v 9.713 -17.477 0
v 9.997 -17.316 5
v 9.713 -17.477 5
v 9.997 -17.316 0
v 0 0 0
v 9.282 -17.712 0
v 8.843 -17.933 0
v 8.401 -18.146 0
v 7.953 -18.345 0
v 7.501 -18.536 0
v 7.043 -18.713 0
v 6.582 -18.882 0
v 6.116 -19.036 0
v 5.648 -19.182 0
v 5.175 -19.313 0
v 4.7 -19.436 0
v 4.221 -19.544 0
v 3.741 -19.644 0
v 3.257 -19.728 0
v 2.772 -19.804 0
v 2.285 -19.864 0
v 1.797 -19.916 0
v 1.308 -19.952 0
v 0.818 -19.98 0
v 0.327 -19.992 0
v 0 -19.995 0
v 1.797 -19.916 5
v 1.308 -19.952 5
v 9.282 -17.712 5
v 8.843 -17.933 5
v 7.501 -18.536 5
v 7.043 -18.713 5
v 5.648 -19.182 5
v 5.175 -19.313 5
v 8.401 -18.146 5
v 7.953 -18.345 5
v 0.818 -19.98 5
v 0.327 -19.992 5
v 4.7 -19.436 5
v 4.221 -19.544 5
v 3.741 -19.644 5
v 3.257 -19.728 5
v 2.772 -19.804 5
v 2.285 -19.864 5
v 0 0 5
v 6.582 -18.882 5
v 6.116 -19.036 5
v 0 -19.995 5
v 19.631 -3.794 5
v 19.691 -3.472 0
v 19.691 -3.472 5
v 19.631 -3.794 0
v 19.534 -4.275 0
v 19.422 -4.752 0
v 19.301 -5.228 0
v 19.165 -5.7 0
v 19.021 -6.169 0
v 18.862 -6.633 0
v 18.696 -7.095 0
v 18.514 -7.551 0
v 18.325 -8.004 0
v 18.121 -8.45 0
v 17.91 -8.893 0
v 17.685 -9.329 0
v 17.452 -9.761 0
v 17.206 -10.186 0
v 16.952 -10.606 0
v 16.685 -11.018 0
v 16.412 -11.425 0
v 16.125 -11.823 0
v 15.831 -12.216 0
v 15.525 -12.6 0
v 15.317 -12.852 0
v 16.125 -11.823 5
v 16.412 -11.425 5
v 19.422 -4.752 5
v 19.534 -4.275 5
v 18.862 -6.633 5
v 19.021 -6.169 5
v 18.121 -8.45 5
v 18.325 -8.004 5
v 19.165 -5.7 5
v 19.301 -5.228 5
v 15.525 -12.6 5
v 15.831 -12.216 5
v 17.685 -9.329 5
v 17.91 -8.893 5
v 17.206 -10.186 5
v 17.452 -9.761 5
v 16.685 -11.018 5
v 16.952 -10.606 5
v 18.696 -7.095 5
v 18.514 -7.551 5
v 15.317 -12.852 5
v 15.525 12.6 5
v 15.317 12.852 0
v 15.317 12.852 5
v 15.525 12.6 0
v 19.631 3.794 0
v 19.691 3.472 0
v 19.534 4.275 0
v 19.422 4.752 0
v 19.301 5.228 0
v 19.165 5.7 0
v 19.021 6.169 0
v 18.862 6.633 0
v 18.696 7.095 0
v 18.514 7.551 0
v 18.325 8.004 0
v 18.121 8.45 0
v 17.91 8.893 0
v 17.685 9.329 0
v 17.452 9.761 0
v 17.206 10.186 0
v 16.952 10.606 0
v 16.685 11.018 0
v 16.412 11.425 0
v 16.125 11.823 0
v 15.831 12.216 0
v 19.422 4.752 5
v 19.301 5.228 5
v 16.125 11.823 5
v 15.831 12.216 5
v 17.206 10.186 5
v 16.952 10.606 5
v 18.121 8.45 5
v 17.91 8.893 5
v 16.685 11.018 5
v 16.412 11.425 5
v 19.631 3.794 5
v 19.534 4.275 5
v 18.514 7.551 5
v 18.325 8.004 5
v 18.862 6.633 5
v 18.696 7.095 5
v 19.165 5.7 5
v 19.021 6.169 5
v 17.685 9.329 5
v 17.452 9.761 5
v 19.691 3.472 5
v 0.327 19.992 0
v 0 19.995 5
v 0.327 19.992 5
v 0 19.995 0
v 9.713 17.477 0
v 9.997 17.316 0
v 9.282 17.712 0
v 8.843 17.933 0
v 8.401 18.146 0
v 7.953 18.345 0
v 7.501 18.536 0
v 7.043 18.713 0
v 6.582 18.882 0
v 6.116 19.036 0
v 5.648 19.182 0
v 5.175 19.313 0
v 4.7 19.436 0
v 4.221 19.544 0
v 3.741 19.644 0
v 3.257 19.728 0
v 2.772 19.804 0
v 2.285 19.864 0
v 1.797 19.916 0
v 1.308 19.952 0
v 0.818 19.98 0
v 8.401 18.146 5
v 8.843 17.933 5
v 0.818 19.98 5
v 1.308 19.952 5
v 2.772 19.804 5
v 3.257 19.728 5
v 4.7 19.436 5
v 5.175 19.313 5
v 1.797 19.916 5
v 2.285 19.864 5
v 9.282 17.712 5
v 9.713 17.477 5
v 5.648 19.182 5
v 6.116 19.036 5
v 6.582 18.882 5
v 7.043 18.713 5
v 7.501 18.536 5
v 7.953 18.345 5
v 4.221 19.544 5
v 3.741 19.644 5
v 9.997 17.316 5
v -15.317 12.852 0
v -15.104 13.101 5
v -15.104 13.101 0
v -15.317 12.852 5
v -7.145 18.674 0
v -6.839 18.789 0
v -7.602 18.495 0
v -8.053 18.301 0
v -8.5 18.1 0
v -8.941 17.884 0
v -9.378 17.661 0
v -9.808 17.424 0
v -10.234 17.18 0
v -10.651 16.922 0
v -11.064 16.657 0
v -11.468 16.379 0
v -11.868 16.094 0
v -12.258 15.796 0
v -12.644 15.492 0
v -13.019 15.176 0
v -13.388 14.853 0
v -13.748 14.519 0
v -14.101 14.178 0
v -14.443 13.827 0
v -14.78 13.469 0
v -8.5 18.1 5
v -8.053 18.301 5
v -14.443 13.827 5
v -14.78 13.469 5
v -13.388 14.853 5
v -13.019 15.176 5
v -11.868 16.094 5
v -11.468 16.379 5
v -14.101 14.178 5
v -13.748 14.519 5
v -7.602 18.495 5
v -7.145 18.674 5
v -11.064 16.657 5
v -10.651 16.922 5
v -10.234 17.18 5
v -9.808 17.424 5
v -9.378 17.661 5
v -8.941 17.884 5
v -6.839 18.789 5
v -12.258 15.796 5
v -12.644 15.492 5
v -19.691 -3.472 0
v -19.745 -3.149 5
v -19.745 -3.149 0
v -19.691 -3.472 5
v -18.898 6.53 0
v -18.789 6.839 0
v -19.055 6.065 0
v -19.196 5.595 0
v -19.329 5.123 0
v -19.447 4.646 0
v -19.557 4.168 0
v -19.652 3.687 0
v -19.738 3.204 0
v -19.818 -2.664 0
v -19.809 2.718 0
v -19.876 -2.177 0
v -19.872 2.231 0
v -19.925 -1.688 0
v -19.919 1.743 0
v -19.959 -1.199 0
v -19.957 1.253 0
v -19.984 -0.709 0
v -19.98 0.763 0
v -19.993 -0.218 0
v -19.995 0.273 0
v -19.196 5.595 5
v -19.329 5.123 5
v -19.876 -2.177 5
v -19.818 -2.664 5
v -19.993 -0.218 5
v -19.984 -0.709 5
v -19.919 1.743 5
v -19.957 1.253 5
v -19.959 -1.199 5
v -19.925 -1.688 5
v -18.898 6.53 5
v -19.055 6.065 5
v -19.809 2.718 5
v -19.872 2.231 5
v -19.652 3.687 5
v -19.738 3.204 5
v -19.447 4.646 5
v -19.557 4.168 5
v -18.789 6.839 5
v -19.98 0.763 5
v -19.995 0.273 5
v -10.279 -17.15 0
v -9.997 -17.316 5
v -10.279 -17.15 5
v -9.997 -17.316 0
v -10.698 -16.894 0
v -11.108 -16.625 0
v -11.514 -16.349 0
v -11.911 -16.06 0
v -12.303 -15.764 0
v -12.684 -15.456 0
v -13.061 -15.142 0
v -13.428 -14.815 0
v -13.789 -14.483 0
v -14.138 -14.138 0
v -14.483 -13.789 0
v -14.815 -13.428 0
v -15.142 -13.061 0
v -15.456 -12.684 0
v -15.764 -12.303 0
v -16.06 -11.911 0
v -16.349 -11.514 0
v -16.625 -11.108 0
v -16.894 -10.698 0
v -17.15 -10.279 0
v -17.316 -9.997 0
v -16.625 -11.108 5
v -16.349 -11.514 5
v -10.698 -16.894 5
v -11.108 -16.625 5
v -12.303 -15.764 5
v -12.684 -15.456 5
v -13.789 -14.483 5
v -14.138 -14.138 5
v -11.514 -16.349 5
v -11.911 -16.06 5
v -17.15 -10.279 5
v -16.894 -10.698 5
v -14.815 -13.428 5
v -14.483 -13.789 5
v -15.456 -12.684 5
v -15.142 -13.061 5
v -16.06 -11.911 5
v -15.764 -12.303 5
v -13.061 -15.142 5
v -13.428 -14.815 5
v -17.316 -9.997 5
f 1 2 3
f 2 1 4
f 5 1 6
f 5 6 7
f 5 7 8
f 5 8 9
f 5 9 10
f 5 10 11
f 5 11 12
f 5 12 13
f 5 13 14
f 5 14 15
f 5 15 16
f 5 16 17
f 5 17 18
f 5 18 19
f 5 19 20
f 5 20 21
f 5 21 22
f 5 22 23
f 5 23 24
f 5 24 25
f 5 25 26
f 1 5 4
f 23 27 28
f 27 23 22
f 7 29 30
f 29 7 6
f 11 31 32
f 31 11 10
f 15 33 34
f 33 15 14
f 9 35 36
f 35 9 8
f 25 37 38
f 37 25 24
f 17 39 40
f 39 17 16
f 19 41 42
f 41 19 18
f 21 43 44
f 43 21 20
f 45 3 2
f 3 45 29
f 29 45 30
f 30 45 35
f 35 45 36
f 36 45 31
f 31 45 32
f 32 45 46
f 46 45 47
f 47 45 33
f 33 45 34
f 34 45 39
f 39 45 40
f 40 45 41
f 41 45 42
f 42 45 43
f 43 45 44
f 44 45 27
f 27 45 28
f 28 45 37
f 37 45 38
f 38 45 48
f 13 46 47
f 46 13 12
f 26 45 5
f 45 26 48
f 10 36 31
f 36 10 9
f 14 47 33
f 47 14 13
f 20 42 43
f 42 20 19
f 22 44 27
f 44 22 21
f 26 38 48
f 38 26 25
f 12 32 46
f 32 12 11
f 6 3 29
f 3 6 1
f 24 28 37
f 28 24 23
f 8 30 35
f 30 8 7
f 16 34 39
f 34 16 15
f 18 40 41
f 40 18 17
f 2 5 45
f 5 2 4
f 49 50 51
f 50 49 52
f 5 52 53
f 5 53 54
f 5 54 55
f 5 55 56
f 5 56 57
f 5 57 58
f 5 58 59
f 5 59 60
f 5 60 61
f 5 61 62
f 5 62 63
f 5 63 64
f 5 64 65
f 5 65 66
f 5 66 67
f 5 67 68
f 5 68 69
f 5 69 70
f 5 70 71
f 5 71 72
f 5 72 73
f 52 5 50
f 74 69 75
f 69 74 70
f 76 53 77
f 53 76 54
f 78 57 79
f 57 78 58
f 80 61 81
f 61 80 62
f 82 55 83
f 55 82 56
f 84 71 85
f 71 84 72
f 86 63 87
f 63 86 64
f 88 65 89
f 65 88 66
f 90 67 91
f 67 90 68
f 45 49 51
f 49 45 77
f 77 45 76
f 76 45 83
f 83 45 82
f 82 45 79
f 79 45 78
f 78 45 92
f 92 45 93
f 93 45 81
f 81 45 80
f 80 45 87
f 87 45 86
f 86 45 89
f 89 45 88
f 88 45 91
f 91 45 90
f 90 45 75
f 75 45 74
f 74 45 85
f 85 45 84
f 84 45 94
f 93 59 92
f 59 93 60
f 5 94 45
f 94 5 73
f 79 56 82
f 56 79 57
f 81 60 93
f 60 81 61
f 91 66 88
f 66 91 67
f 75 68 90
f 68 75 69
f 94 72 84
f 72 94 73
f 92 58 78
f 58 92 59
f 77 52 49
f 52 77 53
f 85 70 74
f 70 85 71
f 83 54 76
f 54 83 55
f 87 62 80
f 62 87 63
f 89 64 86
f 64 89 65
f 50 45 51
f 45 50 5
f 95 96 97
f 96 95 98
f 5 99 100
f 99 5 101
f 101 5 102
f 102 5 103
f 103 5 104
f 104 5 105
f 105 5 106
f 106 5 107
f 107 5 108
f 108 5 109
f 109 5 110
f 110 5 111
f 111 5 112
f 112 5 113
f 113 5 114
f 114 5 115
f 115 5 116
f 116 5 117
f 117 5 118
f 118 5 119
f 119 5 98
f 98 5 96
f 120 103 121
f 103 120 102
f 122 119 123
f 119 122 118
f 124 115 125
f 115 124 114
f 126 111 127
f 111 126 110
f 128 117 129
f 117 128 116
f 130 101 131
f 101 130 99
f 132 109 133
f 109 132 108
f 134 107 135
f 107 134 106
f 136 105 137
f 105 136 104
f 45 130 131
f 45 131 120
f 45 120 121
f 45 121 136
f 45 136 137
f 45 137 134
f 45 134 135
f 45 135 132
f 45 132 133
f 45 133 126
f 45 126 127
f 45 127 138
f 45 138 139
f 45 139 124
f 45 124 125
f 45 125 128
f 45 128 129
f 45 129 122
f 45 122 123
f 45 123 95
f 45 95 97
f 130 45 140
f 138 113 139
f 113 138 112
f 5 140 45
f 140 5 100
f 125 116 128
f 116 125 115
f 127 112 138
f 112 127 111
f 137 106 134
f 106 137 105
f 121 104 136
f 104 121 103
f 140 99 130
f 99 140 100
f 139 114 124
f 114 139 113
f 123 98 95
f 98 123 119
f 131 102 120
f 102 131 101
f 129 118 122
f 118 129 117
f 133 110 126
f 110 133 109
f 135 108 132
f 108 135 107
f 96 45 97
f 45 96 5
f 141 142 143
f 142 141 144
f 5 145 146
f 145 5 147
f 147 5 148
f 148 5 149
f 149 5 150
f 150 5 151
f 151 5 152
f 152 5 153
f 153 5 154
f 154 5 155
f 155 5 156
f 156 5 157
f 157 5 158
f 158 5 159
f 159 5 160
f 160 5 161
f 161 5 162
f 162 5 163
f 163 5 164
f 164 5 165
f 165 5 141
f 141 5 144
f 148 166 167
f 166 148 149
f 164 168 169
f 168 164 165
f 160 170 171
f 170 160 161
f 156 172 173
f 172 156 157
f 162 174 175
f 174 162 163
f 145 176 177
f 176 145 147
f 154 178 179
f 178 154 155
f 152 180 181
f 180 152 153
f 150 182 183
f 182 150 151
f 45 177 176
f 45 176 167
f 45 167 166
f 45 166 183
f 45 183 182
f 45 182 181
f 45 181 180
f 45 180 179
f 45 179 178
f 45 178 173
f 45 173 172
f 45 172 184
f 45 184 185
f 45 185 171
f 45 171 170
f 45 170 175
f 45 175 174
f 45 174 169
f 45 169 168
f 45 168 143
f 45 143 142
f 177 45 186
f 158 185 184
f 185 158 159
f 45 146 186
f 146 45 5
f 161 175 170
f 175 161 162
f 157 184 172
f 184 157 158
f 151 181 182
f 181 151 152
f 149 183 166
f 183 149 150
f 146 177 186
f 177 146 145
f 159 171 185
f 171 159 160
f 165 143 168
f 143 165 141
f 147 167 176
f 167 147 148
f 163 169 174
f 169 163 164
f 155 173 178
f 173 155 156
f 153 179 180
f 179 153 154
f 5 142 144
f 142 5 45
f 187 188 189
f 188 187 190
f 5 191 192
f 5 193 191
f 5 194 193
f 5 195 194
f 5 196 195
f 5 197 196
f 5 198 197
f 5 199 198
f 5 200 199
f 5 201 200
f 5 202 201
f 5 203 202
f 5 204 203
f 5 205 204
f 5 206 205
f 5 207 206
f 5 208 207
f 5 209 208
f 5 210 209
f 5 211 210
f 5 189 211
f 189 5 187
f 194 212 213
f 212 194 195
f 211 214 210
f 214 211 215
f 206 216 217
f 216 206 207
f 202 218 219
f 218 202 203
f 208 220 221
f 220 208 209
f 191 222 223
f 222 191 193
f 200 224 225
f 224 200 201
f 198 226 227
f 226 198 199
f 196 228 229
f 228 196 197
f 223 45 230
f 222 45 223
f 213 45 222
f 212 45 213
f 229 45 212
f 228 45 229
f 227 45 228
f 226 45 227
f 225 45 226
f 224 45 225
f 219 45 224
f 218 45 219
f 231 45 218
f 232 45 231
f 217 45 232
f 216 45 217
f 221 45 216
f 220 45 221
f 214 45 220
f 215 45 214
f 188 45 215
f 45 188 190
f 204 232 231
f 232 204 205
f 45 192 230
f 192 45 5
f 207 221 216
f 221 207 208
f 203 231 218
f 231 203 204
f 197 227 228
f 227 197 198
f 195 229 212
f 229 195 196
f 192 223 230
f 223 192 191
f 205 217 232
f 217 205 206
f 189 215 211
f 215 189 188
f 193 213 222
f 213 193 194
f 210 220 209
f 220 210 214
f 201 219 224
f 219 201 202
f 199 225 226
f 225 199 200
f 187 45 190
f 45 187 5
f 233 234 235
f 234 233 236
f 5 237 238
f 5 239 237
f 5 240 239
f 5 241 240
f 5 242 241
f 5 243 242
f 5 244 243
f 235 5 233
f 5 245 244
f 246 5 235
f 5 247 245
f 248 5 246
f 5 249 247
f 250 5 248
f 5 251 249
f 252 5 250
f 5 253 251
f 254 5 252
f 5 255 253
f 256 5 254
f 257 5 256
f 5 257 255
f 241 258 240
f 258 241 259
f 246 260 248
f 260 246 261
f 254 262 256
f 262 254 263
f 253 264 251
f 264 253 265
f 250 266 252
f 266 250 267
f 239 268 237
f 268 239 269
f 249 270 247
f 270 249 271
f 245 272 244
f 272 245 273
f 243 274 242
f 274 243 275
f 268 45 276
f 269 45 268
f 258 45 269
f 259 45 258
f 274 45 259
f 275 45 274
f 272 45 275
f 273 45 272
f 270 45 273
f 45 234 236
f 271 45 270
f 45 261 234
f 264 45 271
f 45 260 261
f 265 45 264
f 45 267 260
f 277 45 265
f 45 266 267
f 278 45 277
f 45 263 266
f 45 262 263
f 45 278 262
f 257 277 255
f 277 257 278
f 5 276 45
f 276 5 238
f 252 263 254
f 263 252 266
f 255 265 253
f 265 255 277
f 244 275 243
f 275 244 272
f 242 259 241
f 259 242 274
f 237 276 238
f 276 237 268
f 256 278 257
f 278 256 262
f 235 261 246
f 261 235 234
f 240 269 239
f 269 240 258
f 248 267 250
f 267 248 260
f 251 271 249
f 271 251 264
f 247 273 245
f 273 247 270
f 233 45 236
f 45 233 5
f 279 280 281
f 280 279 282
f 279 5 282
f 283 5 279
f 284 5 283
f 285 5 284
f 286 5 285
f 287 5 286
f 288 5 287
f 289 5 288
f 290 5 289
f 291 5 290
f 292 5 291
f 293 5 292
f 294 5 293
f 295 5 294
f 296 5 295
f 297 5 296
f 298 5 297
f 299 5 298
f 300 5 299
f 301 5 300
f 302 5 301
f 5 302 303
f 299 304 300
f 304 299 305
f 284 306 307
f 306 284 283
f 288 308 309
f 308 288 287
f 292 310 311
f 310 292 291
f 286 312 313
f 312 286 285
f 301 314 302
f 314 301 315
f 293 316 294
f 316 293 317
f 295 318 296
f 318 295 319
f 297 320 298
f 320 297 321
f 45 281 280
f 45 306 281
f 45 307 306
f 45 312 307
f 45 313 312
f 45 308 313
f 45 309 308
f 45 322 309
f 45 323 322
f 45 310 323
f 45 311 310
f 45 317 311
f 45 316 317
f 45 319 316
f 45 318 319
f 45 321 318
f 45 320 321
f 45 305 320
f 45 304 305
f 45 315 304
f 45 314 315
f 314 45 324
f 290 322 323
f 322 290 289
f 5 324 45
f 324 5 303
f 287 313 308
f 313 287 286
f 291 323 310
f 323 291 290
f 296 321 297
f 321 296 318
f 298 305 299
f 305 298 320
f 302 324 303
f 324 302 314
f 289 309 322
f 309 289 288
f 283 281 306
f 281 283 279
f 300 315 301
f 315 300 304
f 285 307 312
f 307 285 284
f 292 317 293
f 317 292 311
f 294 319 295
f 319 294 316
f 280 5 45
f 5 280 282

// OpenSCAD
/*
radius = 25;
depth = 5;
height = 10;
angle = 30;
*/

module halfCylinder(h,r) {
  intersection() {
    cylinder(h=h,r=r);
    translate([0,-r,0]) cube([r,2*r,h]);
  }
}

module arcCylinder(h,r,angle) {
  if (angle > 180) {
    union() {
      halfCylinder(h,r);
      rotate([0,0,angle-180]) halfCylinder(h,r);
    }
  } else {
    intersection() {
      halfCylinder(h,r);
      rotate([0,0,angle-180]) halfCylinder(h,r);
    }
  }
}

$fn = $preview ? 0 : 128;

height = 5;
radius = 20;
angle = 30;

//for (rot = [0:36:324]) rotate([0,0,rot]) arcCylinder(height, radius, angle);
for (rot = [0:50:310]) rotate([0,0,rot])arcCylinder(height, radius, angle);

/*
rotate_extrude($fn = 100)
    translate([radius - height, 0, 0])
        square([height,depth]);
        
*/
